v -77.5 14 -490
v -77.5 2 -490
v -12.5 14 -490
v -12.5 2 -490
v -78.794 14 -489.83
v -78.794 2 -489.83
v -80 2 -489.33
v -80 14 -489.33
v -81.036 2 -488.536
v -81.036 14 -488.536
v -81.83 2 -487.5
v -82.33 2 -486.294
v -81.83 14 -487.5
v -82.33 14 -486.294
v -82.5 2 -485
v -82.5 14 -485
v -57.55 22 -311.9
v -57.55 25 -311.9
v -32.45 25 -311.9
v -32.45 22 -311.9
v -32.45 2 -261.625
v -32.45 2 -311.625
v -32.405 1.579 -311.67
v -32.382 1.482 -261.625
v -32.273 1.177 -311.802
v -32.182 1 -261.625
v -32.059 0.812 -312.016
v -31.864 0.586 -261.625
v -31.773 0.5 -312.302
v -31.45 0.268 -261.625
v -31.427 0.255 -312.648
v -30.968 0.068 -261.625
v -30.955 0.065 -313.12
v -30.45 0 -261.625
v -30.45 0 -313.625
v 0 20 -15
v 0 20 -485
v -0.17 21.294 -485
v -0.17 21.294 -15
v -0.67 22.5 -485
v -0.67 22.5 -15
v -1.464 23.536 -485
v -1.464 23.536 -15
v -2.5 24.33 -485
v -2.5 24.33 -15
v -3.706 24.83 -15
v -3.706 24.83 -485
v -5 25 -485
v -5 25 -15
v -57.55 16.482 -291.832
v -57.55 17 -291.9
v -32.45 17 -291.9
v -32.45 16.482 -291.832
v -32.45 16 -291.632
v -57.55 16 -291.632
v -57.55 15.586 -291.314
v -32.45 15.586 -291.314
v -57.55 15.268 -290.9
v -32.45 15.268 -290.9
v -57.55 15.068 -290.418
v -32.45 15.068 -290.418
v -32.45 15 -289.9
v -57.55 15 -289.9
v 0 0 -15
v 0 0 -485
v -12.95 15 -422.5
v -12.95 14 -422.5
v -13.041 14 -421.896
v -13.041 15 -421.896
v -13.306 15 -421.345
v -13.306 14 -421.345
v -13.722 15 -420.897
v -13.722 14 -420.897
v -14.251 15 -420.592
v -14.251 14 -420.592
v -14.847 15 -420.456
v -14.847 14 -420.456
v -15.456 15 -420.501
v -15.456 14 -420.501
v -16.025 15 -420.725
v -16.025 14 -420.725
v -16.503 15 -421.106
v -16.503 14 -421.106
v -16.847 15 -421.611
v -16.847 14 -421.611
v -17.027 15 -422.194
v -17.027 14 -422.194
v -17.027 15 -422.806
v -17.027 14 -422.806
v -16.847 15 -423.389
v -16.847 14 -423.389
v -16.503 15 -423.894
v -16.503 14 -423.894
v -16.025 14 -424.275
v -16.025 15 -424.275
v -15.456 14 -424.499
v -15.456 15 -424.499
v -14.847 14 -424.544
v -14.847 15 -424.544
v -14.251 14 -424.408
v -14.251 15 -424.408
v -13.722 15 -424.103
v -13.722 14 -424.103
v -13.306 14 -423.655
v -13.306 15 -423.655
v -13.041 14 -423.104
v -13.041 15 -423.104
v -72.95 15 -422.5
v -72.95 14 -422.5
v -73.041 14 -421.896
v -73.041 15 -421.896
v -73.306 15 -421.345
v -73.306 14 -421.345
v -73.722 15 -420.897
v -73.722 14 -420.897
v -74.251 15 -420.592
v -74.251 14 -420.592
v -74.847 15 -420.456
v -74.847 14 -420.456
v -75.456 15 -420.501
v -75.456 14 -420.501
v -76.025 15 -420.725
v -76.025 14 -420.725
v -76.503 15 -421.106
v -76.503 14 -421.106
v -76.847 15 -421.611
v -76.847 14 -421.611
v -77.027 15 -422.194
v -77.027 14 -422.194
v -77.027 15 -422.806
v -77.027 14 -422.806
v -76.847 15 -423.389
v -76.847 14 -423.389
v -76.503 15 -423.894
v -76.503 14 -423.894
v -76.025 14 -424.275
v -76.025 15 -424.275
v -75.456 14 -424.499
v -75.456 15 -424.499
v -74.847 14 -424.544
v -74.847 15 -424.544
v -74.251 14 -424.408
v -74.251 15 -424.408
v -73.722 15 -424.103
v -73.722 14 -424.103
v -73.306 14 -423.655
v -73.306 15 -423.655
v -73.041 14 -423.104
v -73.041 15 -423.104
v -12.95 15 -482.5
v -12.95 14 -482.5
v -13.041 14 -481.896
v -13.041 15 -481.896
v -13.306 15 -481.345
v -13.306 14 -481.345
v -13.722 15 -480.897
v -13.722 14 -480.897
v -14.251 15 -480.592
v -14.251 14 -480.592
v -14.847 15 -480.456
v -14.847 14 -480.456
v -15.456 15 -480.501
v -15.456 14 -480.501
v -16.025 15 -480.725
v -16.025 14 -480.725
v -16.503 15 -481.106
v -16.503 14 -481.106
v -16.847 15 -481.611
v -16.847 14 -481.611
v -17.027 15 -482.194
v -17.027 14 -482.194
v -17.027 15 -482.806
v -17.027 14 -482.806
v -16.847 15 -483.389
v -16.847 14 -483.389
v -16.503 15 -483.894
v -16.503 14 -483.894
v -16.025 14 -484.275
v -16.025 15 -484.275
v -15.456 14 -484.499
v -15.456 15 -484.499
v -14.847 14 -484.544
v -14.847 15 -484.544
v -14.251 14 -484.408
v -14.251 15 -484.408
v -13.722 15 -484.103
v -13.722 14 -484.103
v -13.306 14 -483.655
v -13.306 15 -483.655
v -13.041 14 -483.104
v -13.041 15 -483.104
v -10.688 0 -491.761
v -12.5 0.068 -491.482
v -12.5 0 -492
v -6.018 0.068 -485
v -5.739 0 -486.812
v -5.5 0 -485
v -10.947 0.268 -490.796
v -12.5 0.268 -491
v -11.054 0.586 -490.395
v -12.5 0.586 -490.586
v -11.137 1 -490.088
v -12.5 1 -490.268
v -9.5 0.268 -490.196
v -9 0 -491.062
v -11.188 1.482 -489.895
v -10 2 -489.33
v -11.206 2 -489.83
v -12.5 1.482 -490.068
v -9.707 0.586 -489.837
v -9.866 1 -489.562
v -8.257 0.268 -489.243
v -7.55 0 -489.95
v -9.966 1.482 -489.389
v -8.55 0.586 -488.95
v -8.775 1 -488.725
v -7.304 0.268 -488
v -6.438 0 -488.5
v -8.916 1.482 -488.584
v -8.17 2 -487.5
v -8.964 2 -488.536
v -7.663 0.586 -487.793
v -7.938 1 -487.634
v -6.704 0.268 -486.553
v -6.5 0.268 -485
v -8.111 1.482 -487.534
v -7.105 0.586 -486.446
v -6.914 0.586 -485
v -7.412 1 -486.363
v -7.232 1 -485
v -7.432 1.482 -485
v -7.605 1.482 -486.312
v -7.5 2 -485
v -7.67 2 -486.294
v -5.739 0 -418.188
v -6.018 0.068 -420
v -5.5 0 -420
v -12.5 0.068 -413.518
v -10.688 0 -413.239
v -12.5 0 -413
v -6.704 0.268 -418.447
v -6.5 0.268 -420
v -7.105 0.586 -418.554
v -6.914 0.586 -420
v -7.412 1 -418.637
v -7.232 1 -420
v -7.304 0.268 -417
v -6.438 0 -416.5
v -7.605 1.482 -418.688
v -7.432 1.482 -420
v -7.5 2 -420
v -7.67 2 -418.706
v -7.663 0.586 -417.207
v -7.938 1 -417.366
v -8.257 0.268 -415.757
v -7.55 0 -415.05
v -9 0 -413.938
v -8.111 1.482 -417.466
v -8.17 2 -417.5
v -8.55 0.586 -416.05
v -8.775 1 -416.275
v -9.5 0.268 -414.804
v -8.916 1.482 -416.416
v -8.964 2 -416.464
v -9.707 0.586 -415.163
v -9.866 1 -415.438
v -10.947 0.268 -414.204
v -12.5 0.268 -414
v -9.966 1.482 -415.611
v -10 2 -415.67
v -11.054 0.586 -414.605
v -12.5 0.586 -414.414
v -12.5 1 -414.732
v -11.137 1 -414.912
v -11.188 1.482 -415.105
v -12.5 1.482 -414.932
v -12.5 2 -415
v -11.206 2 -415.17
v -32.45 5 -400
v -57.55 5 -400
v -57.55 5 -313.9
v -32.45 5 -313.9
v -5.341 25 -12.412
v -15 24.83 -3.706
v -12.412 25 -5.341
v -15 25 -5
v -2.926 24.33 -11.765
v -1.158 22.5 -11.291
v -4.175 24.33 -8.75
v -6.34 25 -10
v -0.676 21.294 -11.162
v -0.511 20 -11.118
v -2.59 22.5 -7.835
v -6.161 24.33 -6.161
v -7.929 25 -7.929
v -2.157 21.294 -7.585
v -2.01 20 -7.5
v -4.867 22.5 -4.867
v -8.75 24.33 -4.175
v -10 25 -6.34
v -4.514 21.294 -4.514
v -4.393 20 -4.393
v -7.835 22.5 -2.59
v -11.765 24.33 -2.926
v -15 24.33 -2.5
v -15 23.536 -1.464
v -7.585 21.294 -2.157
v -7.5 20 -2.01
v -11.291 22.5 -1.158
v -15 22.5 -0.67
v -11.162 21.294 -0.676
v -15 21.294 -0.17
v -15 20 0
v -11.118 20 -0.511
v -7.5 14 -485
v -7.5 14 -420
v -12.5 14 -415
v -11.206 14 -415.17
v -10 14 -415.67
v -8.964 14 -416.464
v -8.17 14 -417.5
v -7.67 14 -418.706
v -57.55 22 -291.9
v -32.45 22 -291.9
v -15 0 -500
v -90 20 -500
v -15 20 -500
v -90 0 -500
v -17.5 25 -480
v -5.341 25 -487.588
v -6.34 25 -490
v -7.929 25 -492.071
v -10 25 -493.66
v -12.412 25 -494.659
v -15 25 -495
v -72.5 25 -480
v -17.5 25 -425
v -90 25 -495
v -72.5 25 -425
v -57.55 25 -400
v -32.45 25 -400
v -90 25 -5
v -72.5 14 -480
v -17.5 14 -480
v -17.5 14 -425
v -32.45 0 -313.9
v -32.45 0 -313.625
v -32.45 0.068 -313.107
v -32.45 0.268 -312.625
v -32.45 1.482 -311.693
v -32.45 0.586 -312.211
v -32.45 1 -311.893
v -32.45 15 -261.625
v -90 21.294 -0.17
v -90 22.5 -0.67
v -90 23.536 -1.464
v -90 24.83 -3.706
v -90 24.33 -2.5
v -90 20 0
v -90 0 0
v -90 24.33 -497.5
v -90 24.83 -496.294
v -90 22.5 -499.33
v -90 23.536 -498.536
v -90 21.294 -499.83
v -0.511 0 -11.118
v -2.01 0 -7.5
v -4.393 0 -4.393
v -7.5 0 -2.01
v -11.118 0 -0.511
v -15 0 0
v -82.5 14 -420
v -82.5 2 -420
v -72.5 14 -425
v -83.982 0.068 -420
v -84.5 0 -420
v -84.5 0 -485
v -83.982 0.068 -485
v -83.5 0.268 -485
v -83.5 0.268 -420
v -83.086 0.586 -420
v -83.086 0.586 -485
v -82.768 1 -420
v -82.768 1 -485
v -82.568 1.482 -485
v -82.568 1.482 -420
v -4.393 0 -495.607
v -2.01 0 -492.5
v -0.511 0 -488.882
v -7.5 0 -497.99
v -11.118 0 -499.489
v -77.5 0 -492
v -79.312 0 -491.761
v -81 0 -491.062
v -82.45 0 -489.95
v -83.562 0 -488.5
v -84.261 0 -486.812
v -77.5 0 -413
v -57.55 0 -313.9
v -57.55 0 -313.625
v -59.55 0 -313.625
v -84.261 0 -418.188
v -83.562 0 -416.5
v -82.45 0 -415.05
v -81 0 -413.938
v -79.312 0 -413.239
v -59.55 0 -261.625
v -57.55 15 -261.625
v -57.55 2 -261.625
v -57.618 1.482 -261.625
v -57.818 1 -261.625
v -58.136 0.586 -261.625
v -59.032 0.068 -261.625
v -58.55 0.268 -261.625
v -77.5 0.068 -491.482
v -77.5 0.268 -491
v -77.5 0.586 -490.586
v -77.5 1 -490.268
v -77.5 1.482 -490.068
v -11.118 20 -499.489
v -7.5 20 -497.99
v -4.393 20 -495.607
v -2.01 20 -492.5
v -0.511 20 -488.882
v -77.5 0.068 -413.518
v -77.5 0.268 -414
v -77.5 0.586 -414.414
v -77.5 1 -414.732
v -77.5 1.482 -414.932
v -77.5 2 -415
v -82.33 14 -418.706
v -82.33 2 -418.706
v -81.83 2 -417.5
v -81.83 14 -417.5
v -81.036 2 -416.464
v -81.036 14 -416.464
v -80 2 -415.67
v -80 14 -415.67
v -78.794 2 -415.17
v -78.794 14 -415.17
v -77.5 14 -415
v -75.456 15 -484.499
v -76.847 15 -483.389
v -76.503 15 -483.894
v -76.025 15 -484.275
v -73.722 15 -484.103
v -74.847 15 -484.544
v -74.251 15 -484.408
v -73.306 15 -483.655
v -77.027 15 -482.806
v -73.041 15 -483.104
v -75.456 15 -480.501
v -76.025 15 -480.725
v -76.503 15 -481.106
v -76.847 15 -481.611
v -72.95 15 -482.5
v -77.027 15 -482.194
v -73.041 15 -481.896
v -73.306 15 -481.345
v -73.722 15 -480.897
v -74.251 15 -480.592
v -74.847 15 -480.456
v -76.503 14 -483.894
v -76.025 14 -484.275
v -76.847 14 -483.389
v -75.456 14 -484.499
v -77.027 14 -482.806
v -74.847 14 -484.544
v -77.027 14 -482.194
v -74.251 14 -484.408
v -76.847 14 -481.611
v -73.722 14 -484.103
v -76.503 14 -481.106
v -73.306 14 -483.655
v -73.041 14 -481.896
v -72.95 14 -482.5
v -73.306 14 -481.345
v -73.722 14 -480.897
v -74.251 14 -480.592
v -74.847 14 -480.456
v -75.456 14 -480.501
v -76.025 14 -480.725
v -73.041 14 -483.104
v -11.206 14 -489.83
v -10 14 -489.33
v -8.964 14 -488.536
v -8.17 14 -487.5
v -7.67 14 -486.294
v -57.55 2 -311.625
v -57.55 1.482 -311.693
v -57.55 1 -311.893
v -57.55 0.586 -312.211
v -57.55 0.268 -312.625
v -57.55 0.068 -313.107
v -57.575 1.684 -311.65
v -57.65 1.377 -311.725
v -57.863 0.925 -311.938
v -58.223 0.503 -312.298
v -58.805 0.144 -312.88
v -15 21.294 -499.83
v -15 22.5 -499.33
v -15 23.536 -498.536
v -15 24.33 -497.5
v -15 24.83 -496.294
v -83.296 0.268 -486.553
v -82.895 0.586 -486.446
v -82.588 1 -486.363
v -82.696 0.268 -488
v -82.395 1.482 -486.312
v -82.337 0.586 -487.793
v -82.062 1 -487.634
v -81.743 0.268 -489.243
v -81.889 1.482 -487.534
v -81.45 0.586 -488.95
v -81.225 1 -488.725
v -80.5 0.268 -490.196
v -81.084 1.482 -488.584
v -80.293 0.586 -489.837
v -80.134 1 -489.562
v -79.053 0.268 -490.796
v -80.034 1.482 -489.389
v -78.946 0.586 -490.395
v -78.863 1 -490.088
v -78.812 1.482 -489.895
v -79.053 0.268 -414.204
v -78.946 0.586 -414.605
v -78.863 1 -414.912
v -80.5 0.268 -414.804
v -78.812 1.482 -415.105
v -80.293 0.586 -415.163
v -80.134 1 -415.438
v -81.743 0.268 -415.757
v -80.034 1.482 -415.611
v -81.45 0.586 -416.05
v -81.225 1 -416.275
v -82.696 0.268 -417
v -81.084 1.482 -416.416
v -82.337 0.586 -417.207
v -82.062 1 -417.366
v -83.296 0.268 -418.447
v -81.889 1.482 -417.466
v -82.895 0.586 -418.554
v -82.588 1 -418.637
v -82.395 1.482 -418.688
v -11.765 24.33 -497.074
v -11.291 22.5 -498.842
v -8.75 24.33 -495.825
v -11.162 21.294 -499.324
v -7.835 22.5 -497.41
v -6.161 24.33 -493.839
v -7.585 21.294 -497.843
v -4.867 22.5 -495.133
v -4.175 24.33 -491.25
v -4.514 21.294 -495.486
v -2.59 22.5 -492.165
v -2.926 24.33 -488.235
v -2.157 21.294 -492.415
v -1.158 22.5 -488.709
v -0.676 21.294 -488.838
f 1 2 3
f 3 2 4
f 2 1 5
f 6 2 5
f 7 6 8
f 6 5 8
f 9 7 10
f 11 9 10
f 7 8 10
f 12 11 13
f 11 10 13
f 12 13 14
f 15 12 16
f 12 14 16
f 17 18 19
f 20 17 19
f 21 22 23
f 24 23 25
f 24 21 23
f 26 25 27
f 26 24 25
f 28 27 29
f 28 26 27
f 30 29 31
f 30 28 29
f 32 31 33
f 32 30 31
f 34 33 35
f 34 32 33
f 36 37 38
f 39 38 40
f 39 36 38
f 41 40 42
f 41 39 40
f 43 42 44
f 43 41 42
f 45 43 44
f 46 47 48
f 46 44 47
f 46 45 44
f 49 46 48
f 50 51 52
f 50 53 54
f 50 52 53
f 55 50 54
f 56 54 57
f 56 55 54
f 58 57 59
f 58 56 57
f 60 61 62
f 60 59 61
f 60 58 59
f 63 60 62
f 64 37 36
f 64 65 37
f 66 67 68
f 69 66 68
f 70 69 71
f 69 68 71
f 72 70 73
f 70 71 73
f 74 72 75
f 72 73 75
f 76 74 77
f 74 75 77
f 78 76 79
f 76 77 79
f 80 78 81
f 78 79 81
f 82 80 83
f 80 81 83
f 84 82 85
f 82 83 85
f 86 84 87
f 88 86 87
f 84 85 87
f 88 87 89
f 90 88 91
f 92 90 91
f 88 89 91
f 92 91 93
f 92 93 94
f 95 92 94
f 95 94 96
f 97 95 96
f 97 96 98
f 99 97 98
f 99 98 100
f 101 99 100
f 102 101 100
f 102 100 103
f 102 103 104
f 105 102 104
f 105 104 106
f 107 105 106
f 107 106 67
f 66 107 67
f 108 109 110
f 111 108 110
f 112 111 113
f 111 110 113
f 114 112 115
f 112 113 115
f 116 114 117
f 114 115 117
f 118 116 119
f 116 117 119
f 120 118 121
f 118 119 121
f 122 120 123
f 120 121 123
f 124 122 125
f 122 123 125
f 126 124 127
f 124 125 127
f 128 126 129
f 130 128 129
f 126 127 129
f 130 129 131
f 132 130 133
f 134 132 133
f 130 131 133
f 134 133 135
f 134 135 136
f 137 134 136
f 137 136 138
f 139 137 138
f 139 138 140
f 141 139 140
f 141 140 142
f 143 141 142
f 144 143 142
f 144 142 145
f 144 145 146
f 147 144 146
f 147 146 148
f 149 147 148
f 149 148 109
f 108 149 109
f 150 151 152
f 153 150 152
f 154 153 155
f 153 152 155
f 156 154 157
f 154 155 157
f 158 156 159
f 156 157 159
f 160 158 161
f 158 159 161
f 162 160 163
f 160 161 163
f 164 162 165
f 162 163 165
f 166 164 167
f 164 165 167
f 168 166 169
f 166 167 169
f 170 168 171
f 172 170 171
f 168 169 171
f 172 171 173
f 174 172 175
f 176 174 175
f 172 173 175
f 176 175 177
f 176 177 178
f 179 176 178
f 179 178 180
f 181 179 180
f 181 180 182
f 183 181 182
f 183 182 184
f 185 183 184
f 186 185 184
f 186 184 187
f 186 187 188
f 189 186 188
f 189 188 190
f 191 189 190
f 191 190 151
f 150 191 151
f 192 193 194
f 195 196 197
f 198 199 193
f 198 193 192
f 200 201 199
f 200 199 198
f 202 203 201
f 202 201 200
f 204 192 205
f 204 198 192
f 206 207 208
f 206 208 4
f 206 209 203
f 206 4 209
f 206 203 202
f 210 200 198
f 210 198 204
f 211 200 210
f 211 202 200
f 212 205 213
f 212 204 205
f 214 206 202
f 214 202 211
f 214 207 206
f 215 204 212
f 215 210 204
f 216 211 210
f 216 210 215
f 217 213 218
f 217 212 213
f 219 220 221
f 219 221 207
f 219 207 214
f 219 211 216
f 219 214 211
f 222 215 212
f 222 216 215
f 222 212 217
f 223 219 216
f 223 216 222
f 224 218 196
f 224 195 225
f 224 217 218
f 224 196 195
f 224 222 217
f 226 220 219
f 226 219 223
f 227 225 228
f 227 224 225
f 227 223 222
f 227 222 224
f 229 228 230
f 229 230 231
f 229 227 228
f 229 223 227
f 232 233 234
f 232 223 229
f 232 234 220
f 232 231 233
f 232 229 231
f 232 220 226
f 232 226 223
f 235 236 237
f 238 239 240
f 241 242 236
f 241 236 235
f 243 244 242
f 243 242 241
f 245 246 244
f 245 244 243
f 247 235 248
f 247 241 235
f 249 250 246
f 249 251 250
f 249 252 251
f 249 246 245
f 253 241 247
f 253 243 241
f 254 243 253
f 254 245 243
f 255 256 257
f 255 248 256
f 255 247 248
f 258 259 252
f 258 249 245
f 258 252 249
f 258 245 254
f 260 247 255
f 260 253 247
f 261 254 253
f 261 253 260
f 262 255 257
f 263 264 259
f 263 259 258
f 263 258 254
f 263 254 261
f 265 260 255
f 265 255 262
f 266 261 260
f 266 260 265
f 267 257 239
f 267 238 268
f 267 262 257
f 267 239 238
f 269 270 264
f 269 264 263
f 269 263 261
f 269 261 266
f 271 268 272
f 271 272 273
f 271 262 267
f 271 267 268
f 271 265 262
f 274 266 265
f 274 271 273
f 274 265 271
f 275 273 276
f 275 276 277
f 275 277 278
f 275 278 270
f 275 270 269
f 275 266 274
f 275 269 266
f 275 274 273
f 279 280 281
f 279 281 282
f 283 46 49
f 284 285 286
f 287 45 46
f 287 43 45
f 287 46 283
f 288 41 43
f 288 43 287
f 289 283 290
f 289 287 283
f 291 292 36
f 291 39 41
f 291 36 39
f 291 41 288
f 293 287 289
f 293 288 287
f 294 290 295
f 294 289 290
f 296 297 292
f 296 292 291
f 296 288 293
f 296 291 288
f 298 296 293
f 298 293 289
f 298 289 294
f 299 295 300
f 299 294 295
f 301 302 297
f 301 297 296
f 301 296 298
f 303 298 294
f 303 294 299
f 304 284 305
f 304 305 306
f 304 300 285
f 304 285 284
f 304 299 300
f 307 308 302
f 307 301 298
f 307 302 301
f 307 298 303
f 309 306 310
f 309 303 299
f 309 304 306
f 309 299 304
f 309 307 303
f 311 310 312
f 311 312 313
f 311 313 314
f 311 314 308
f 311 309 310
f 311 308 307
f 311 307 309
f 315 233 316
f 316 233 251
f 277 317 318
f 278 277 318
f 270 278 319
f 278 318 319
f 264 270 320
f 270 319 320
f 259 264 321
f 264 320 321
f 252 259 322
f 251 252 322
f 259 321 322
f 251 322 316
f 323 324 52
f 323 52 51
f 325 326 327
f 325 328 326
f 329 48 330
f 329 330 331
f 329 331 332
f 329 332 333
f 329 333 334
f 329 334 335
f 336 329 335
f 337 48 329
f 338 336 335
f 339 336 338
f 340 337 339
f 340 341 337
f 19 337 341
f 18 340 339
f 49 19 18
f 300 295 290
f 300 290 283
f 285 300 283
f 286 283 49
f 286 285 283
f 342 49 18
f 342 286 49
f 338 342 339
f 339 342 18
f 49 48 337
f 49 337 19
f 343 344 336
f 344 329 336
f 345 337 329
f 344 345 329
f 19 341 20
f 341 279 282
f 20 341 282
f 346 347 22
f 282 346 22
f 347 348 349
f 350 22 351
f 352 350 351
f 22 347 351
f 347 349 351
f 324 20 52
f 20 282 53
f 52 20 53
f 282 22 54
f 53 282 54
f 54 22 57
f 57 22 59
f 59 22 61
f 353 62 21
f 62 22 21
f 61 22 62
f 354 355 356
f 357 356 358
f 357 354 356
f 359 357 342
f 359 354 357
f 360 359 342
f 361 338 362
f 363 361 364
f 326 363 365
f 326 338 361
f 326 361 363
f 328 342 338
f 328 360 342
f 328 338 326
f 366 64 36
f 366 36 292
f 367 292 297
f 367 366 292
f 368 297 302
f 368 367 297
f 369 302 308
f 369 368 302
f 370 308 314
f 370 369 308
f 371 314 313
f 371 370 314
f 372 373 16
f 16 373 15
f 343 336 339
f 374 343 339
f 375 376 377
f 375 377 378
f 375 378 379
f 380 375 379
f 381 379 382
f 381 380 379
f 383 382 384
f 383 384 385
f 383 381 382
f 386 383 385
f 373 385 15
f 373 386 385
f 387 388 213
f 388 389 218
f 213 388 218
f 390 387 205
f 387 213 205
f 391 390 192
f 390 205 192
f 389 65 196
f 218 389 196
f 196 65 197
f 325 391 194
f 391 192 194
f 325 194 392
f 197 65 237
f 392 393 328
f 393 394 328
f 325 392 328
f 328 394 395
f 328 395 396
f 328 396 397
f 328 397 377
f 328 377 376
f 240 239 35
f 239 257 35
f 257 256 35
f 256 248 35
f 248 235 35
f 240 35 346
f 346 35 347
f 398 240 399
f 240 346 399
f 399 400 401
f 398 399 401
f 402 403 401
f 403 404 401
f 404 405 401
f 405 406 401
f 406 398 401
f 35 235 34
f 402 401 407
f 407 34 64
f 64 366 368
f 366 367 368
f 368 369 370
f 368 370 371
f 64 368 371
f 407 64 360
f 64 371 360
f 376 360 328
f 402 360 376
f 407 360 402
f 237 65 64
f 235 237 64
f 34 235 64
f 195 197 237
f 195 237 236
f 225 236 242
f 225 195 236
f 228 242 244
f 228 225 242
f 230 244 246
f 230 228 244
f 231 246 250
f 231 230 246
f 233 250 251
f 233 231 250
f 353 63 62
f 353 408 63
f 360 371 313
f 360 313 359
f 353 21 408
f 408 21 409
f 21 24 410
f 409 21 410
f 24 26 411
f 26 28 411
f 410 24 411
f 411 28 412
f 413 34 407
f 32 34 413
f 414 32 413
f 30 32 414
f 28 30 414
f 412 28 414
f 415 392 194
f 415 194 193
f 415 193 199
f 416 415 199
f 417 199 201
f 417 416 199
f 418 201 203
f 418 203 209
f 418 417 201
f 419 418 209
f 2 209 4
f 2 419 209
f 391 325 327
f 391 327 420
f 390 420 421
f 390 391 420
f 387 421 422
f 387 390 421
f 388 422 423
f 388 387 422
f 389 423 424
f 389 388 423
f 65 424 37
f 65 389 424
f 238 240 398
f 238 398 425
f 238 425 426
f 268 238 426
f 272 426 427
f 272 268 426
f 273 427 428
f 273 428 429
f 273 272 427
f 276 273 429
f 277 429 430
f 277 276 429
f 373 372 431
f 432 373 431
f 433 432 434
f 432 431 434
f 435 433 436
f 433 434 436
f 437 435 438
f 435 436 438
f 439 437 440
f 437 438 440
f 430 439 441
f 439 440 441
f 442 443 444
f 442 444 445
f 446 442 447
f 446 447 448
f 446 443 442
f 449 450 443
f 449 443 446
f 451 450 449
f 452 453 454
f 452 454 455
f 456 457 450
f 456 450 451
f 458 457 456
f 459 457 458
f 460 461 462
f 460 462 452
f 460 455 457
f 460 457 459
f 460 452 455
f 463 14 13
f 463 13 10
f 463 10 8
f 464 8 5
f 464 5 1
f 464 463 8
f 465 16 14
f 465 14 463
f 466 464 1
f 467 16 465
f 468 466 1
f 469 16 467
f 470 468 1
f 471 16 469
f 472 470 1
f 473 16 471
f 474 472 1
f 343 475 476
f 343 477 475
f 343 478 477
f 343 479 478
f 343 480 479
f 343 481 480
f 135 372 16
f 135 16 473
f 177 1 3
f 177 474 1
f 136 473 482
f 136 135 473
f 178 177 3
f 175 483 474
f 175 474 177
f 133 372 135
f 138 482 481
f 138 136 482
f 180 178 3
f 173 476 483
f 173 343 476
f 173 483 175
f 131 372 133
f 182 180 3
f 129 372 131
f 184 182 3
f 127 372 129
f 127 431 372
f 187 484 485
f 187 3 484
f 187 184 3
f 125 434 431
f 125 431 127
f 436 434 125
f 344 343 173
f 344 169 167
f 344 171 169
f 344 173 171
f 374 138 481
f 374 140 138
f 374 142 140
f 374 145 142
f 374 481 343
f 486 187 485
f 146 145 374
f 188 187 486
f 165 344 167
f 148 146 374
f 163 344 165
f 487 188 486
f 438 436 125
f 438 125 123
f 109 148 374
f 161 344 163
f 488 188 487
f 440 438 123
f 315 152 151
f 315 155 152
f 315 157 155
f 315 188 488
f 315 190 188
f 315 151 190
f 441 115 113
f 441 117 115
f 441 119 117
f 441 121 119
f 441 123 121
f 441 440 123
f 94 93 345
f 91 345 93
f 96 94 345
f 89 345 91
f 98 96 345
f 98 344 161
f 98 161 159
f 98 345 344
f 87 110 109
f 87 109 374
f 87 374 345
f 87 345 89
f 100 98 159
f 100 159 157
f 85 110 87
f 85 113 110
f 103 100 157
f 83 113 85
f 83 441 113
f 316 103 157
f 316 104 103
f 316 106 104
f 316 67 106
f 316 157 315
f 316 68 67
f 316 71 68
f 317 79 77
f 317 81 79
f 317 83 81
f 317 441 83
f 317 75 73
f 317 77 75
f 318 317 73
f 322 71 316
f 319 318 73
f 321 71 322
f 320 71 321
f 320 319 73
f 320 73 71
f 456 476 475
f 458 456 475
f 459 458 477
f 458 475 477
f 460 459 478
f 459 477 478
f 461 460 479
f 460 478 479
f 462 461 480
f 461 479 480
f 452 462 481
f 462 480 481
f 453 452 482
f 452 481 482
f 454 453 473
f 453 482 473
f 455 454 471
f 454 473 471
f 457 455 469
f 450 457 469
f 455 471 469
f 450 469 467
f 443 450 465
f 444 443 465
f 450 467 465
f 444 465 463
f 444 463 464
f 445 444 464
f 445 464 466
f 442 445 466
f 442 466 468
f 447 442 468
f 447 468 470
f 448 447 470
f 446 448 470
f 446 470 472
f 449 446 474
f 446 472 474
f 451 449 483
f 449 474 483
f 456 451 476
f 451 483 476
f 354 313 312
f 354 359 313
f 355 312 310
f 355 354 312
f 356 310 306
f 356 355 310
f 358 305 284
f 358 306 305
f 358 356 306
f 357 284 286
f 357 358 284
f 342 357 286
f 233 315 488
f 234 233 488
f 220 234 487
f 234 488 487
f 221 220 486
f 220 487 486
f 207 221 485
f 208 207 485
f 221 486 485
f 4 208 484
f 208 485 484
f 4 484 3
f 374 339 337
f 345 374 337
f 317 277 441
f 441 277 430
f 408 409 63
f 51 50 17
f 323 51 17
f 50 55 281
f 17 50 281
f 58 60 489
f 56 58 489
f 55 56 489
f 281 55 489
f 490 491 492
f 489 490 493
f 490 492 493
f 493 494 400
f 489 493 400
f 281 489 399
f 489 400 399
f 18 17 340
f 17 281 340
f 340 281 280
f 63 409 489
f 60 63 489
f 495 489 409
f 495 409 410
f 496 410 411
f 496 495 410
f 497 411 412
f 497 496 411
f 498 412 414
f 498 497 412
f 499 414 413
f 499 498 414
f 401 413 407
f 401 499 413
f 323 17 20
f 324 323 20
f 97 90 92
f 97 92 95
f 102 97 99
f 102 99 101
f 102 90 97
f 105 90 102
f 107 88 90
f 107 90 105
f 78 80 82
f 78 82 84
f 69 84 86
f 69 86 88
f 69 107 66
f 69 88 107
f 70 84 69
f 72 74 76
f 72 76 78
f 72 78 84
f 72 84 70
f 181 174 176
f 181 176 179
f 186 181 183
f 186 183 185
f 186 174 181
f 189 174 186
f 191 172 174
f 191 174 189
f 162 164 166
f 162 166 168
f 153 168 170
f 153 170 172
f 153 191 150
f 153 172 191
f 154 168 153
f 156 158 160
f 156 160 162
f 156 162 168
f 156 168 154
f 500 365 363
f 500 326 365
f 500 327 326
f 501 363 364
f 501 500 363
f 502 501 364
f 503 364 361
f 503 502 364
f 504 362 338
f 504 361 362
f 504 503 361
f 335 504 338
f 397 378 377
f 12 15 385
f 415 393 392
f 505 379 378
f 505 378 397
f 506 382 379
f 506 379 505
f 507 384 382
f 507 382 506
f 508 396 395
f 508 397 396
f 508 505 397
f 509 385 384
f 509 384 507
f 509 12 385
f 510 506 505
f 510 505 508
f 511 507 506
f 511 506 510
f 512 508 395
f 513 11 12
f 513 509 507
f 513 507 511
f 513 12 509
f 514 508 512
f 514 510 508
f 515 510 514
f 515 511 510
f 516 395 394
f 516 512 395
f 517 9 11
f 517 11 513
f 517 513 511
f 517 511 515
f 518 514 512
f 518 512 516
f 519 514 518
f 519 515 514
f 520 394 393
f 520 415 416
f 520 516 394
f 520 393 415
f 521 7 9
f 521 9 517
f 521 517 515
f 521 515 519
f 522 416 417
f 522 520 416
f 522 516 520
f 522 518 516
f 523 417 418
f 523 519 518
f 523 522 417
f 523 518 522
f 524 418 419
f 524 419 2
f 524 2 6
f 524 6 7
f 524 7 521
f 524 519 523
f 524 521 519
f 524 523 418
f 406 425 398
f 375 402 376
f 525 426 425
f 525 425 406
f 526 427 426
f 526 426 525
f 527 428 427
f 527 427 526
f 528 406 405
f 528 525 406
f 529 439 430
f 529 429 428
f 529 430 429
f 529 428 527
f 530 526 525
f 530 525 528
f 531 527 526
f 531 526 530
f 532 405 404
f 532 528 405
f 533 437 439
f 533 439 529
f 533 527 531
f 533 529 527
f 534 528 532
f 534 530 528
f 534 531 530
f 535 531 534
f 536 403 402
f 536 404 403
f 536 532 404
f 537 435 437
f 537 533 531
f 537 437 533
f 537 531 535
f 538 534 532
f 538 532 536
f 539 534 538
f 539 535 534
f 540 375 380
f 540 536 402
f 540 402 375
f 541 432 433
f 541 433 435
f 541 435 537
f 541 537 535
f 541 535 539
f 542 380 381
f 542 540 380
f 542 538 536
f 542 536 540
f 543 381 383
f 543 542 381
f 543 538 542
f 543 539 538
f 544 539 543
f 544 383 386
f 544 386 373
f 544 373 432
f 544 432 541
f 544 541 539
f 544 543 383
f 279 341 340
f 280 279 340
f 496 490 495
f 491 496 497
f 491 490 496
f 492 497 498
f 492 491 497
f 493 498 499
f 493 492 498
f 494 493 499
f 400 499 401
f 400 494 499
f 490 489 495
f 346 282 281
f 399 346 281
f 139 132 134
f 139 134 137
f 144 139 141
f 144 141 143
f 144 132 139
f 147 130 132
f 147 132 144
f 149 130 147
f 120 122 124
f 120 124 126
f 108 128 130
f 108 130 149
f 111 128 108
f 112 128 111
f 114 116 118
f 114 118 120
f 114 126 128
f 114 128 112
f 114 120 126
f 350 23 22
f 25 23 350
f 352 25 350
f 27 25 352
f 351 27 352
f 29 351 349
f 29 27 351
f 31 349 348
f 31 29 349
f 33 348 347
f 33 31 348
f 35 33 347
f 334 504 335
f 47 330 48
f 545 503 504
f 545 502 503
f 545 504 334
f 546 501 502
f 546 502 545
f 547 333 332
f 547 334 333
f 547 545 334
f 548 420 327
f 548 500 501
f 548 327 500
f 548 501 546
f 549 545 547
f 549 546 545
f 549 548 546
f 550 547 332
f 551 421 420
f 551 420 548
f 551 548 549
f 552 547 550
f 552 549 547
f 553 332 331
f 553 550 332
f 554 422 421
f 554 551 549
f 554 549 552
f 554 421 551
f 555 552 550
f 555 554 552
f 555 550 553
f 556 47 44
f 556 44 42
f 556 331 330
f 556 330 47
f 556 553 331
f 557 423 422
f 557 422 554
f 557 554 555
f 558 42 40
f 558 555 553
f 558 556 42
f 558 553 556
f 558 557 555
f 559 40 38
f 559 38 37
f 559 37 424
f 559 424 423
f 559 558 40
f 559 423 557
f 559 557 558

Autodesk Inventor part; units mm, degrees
ref_plane "YZ Plane" through (0, 0, 0) normal (1, 0, 0) x (0, 1, 0)
ref_plane "XZ Plane" through (0, 0, 0) normal (0, 1, 0) x (-1, 0, 0)
sketch "Sketch1" plane through (0, 0, 0) normal (0, 1, 0) x (-1, 0, 0)
  line L0 (0, 0) -> (90, 0)
  line L1 (90, 0) -> (90, -500)
  line L2 (90, -500) -> (0, -500)
  line L3 (0, -500) -> (0, 0)
  dimension "d0" = 90
  dimension "d1" = 500
extrude "Extrusion1" add sketch "Sketch1" along normal blind 25
sketch "Sketch6" plane through (0, 25, 0) normal (0, 1, 0) x (1, 0, 0)
  line L0 (-57.55, 311.9) -> (-32.45, 311.9)
  line L1 (-32.45, 311.9) -> (-32.45, 400)
  line L2 (-32.45, 400) -> (-57.55, 400)
  line L3 (-57.55, 400) -> (-57.55, 311.9)
  line L4 (-90, 500) -> (-90, 0) projected
  line L5 (0, 500) -> (-90, 500) projected
  point P0 (0, 0)
  dimension "d36" = 25.1
  dimension "d37" = 88.1
  dimension "d38" = 32.45
  dimension "d39" = 100
extrude "Extrusion6" cut sketch "Sketch6" against normal blind 20
sketch "Sketch7" plane through (-32.45, 25, -311.9) normal (0, 0, -1) x (-1, 0, 0)
  line L0 (0, 0) -> (25.1, 0) projected
  line L1 (0, 0) -> (0, -20) projected
  line L2 (0, -20) -> (25.1, -20) projected
  line L3 (25.1, 0) -> (25.1, -20) projected
  line L4 (0, -4) -> (25.1, -4)
  line L5 (25.1, -4) -> (25.1, -23)
  line L6 (0, -4) -> (0, -23)
  line L7 (25.1, -23) -> (0, -23)
  point P0 (-32.45, -25)
  dimension "d42" = 16
  dimension "d43" = 19
  dimension "d44" = 19
ref_plane "Work Plane2" through (-32.45, 25, -313.9) normal (0, 0, -1) x (-1, 0, 0)
sketch "Sketch9" plane through (-32.45, 25, -313.9) normal (0, 0, -1) x (-1, 0, 0)
  line L0 (25.1, -4) -> (25.1, -23) projected
  line L1 (0, 0) -> (0, -20) projected
  line L2 (25.1, -23) -> (0, -23) projected
  line L3 (0, -23) -> (0, -4)
  line L4 (0, 0) -> (25.1, 0) projected
  line L5 (25.1, -4) -> (25.1, 0)
  line L6 (0, 0) -> (25.1, 0)
  line L7 (0, 0) -> (0, -4)
  line L8 (25.1, -3) -> (0, -3)
  point P0 (-32.45, -25)
  dimension "d97" = 3
extrude "Extrusion9" cut sketch "Sketch9" against normal blind 22 contours L0 L2 L3 L1 L8 L5
sketch "Sketch12" plane through (0, 25, 0) normal (0, 1, 0) x (1, 0, 0)
  line L0 (-17.5, 480) -> (-72.5, 480)
  line L1 (-72.5, 480) -> (-72.5, 425)
  line L2 (-72.5, 425) -> (-17.5, 425)
  line L3 (-17.5, 425) -> (-17.5, 480)
  line L4 (0, 0) -> (0, 500) projected
  line L5 (-32.45, 311.9) -> (-57.55, 311.9) projected
  line L6 (0, 500) -> (-90, 500) projected
  dimension "d57" = 55
  dimension "d58" = 55
  dimension "d59" = 17.5
  dimension "d100" = 20
extrude "Extrusion11" cut sketch "Sketch12" against normal blind 30
sketch "Sketch13" plane through (0, 0, 0) normal (0, -1, 0) x (1, 0, 0)
  line L0 (-72.5, -425) -> (-17.5, -425) projected
  line L1 (-17.5, -425) -> (-17.5, -480) projected
  line L2 (-17.5, -480) -> (-72.5, -480) projected
  line L3 (-72.5, -480) -> (-72.5, -425) projected
  line L4 (-7.5, -490) -> (-7.5, -415)
  line L5 (-7.5, -415) -> (-82.5, -415)
  line L6 (-82.5, -415) -> (-82.5, -490)
  line L7 (-82.5, -490) -> (-7.5, -490)
  point P0 (0, 0)
  dimension "d68" = 10
extrude "Extrusion12" cut sketch "Sketch13" against normal blind 14
sketch "Sketch14" plane through (0, 25, 0) normal (0, 1, 0) x (1, 0, 0)
  line L0 (-72.5, 425) -> (-72.5, 480) projected
  line L1 (-17.5, 425) -> (-72.5, 425) projected
  line L2 (-17.5, 480) -> (-17.5, 425) projected
  line L3 (-72.5, 480) -> (-17.5, 480) projected
  line L4 (-75, 482.5) -> (-75, 422.5) construction
  line L5 (-75, 422.5) -> (-15, 422.5) construction
  line L6 (-15, 422.5) -> (-15, 482.5) construction
  line L7 (-15, 482.5) -> (-75, 482.5) construction
  circle A0 centre (-75, 422.5) radius 2.05
  circle A1 centre (-75, 482.5) radius 2.05
  circle A2 centre (-15, 482.5) radius 2.05
  circle A3 centre (-15, 422.5) radius 2.05
  point P0 (0, 0)
  dimension "d69" = 2.5
  dimension "d70" = 4.1
  dimension "d71" = 4.1
  dimension "d72" = 4.1
  dimension "d73" = 4.1
fillet "Fillet14" radius 5 4 edges at (-82.5, 7, -415) (-7.5, 7, -415) (-7.5, 7, -490) (-82.5, 7, -490)
fillet "Fillet15" radius 2 8 edges at (-8.9645, 0, -488.5355) (-45, 0, -490) (-81.0355, 0, -488.5355) (-82.5, 0, -452.5) (-81.0355, 0, -416.4645) (-45, 0, -415) (-8.9645, 0, -416.4645) (-7.5, 0, -452.5)
sketch "Sketch15" plane through (0, 0, 0) normal (0, -1, 0) x (1, 0, 0)
  line L0 (-57.55, -311.625) -> (-32.45, -311.625)
  line L1 (-32.45, -311.625) -> (-32.45, -261.625)
  line L2 (-32.45, -261.625) -> (-57.55, -261.625)
  line L3 (-57.55, -261.625) -> (-57.55, -311.625)
  line L4 (-90, 0) -> (-90, -500) projected
  line L5 (-90, -500) -> (0, -500) projected
  point P0 (0, 0)
  dimension "d81" = 25.1
  dimension "d82" = 50
  dimension "d83" = 32.45
  dimension "d84" = 188.375
extrude "Extrusion14" cut sketch "Sketch15" against normal blind 15
fillet "Fillet16" radius 2 1 edges at (-45, 15, -291.9)
fillet "Fillet17" radius 2 3 edges at (-32.45, 0, -286.625) (-57.55, 0, -286.625) (-45, 0, -311.625)
fillet "Fillet18" radius 5 3 edges at (0, 25, -250) (-45, 25, 0) (-45, 25, -500)
fillet "Fillet19" radius 15 4 edges at (-1.4645, 23.5355, -1.4645) (0, 10, 0) (-1.4645, 23.5355, -498.5355) (0, 10, -500)
sketch "Sketch22" plane through (-57.55, 2, -313.9) normal (0, 1, 0) x (1, 0, 0)
  line L0 (0, -2.275) -> (25.1, -2.275) projected
  line L1 (25.1, 0) -> (25.1, -2.275) projected
  line L2 (25.1, 0) -> (0, 0) projected
  line L3 (0, 0) -> (0, -2.275) projected
  point P0 (57.55, -313.9)
extrude "Extrusion18" cut sketch "Sketch22" against normal blind 6
sketch "Sketch23" plane through (0, 0, 0) normal (0, -1, 0) x (1, 0, 0)
  point P0 (0, 0)
sketch "Sketch24" plane through (0, 25, 0) normal (0, 1, 0) x (1, 0, 0)
  line L0 (-24.2952, 12.3012) -> (-24.2952, 52.9327) construction
  line L1 (-24.2952, 52.9327) -> (-73.6667, 52.9327) construction
  line L2 (-73.6667, 52.9327) -> (-73.6667, 12.3012) construction
  line L3 (-73.6667, 12.3012) -> (-24.2952, 12.3012) construction
  point P0 (0, 0)
extrude "Extrusion19" [suppressed]
sketch "Sketch25" plane through (0, 14, 0) normal (0, -1, 0) x (1, 0, 0)
  line L0 (-17.5, -480) -> (-17.5, -425) projected
  line L1 (-17.5, -425) -> (-72.5, -425) projected
  line L2 (-72.5, -480) -> (-17.5, -480) projected
  line L3 (-72.5, -425) -> (-72.5, -480) projected
  circle A0 centre (-75, -482.5) radius 2.05 projected
  circle A1 centre (-15, -482.5) radius 2.05 projected
  circle A2 centre (-15, -422.5) radius 2.05 projected
  circle A3 centre (-75, -422.5) radius 2.05 projected
  point P0 (0, 0)
extrude "Extrusion20" cut sketch "Sketch25" against normal blind 1 contours A0 | A1 | A2 | A3
properties part number "Hilla" material "Lauan, Meranti"
